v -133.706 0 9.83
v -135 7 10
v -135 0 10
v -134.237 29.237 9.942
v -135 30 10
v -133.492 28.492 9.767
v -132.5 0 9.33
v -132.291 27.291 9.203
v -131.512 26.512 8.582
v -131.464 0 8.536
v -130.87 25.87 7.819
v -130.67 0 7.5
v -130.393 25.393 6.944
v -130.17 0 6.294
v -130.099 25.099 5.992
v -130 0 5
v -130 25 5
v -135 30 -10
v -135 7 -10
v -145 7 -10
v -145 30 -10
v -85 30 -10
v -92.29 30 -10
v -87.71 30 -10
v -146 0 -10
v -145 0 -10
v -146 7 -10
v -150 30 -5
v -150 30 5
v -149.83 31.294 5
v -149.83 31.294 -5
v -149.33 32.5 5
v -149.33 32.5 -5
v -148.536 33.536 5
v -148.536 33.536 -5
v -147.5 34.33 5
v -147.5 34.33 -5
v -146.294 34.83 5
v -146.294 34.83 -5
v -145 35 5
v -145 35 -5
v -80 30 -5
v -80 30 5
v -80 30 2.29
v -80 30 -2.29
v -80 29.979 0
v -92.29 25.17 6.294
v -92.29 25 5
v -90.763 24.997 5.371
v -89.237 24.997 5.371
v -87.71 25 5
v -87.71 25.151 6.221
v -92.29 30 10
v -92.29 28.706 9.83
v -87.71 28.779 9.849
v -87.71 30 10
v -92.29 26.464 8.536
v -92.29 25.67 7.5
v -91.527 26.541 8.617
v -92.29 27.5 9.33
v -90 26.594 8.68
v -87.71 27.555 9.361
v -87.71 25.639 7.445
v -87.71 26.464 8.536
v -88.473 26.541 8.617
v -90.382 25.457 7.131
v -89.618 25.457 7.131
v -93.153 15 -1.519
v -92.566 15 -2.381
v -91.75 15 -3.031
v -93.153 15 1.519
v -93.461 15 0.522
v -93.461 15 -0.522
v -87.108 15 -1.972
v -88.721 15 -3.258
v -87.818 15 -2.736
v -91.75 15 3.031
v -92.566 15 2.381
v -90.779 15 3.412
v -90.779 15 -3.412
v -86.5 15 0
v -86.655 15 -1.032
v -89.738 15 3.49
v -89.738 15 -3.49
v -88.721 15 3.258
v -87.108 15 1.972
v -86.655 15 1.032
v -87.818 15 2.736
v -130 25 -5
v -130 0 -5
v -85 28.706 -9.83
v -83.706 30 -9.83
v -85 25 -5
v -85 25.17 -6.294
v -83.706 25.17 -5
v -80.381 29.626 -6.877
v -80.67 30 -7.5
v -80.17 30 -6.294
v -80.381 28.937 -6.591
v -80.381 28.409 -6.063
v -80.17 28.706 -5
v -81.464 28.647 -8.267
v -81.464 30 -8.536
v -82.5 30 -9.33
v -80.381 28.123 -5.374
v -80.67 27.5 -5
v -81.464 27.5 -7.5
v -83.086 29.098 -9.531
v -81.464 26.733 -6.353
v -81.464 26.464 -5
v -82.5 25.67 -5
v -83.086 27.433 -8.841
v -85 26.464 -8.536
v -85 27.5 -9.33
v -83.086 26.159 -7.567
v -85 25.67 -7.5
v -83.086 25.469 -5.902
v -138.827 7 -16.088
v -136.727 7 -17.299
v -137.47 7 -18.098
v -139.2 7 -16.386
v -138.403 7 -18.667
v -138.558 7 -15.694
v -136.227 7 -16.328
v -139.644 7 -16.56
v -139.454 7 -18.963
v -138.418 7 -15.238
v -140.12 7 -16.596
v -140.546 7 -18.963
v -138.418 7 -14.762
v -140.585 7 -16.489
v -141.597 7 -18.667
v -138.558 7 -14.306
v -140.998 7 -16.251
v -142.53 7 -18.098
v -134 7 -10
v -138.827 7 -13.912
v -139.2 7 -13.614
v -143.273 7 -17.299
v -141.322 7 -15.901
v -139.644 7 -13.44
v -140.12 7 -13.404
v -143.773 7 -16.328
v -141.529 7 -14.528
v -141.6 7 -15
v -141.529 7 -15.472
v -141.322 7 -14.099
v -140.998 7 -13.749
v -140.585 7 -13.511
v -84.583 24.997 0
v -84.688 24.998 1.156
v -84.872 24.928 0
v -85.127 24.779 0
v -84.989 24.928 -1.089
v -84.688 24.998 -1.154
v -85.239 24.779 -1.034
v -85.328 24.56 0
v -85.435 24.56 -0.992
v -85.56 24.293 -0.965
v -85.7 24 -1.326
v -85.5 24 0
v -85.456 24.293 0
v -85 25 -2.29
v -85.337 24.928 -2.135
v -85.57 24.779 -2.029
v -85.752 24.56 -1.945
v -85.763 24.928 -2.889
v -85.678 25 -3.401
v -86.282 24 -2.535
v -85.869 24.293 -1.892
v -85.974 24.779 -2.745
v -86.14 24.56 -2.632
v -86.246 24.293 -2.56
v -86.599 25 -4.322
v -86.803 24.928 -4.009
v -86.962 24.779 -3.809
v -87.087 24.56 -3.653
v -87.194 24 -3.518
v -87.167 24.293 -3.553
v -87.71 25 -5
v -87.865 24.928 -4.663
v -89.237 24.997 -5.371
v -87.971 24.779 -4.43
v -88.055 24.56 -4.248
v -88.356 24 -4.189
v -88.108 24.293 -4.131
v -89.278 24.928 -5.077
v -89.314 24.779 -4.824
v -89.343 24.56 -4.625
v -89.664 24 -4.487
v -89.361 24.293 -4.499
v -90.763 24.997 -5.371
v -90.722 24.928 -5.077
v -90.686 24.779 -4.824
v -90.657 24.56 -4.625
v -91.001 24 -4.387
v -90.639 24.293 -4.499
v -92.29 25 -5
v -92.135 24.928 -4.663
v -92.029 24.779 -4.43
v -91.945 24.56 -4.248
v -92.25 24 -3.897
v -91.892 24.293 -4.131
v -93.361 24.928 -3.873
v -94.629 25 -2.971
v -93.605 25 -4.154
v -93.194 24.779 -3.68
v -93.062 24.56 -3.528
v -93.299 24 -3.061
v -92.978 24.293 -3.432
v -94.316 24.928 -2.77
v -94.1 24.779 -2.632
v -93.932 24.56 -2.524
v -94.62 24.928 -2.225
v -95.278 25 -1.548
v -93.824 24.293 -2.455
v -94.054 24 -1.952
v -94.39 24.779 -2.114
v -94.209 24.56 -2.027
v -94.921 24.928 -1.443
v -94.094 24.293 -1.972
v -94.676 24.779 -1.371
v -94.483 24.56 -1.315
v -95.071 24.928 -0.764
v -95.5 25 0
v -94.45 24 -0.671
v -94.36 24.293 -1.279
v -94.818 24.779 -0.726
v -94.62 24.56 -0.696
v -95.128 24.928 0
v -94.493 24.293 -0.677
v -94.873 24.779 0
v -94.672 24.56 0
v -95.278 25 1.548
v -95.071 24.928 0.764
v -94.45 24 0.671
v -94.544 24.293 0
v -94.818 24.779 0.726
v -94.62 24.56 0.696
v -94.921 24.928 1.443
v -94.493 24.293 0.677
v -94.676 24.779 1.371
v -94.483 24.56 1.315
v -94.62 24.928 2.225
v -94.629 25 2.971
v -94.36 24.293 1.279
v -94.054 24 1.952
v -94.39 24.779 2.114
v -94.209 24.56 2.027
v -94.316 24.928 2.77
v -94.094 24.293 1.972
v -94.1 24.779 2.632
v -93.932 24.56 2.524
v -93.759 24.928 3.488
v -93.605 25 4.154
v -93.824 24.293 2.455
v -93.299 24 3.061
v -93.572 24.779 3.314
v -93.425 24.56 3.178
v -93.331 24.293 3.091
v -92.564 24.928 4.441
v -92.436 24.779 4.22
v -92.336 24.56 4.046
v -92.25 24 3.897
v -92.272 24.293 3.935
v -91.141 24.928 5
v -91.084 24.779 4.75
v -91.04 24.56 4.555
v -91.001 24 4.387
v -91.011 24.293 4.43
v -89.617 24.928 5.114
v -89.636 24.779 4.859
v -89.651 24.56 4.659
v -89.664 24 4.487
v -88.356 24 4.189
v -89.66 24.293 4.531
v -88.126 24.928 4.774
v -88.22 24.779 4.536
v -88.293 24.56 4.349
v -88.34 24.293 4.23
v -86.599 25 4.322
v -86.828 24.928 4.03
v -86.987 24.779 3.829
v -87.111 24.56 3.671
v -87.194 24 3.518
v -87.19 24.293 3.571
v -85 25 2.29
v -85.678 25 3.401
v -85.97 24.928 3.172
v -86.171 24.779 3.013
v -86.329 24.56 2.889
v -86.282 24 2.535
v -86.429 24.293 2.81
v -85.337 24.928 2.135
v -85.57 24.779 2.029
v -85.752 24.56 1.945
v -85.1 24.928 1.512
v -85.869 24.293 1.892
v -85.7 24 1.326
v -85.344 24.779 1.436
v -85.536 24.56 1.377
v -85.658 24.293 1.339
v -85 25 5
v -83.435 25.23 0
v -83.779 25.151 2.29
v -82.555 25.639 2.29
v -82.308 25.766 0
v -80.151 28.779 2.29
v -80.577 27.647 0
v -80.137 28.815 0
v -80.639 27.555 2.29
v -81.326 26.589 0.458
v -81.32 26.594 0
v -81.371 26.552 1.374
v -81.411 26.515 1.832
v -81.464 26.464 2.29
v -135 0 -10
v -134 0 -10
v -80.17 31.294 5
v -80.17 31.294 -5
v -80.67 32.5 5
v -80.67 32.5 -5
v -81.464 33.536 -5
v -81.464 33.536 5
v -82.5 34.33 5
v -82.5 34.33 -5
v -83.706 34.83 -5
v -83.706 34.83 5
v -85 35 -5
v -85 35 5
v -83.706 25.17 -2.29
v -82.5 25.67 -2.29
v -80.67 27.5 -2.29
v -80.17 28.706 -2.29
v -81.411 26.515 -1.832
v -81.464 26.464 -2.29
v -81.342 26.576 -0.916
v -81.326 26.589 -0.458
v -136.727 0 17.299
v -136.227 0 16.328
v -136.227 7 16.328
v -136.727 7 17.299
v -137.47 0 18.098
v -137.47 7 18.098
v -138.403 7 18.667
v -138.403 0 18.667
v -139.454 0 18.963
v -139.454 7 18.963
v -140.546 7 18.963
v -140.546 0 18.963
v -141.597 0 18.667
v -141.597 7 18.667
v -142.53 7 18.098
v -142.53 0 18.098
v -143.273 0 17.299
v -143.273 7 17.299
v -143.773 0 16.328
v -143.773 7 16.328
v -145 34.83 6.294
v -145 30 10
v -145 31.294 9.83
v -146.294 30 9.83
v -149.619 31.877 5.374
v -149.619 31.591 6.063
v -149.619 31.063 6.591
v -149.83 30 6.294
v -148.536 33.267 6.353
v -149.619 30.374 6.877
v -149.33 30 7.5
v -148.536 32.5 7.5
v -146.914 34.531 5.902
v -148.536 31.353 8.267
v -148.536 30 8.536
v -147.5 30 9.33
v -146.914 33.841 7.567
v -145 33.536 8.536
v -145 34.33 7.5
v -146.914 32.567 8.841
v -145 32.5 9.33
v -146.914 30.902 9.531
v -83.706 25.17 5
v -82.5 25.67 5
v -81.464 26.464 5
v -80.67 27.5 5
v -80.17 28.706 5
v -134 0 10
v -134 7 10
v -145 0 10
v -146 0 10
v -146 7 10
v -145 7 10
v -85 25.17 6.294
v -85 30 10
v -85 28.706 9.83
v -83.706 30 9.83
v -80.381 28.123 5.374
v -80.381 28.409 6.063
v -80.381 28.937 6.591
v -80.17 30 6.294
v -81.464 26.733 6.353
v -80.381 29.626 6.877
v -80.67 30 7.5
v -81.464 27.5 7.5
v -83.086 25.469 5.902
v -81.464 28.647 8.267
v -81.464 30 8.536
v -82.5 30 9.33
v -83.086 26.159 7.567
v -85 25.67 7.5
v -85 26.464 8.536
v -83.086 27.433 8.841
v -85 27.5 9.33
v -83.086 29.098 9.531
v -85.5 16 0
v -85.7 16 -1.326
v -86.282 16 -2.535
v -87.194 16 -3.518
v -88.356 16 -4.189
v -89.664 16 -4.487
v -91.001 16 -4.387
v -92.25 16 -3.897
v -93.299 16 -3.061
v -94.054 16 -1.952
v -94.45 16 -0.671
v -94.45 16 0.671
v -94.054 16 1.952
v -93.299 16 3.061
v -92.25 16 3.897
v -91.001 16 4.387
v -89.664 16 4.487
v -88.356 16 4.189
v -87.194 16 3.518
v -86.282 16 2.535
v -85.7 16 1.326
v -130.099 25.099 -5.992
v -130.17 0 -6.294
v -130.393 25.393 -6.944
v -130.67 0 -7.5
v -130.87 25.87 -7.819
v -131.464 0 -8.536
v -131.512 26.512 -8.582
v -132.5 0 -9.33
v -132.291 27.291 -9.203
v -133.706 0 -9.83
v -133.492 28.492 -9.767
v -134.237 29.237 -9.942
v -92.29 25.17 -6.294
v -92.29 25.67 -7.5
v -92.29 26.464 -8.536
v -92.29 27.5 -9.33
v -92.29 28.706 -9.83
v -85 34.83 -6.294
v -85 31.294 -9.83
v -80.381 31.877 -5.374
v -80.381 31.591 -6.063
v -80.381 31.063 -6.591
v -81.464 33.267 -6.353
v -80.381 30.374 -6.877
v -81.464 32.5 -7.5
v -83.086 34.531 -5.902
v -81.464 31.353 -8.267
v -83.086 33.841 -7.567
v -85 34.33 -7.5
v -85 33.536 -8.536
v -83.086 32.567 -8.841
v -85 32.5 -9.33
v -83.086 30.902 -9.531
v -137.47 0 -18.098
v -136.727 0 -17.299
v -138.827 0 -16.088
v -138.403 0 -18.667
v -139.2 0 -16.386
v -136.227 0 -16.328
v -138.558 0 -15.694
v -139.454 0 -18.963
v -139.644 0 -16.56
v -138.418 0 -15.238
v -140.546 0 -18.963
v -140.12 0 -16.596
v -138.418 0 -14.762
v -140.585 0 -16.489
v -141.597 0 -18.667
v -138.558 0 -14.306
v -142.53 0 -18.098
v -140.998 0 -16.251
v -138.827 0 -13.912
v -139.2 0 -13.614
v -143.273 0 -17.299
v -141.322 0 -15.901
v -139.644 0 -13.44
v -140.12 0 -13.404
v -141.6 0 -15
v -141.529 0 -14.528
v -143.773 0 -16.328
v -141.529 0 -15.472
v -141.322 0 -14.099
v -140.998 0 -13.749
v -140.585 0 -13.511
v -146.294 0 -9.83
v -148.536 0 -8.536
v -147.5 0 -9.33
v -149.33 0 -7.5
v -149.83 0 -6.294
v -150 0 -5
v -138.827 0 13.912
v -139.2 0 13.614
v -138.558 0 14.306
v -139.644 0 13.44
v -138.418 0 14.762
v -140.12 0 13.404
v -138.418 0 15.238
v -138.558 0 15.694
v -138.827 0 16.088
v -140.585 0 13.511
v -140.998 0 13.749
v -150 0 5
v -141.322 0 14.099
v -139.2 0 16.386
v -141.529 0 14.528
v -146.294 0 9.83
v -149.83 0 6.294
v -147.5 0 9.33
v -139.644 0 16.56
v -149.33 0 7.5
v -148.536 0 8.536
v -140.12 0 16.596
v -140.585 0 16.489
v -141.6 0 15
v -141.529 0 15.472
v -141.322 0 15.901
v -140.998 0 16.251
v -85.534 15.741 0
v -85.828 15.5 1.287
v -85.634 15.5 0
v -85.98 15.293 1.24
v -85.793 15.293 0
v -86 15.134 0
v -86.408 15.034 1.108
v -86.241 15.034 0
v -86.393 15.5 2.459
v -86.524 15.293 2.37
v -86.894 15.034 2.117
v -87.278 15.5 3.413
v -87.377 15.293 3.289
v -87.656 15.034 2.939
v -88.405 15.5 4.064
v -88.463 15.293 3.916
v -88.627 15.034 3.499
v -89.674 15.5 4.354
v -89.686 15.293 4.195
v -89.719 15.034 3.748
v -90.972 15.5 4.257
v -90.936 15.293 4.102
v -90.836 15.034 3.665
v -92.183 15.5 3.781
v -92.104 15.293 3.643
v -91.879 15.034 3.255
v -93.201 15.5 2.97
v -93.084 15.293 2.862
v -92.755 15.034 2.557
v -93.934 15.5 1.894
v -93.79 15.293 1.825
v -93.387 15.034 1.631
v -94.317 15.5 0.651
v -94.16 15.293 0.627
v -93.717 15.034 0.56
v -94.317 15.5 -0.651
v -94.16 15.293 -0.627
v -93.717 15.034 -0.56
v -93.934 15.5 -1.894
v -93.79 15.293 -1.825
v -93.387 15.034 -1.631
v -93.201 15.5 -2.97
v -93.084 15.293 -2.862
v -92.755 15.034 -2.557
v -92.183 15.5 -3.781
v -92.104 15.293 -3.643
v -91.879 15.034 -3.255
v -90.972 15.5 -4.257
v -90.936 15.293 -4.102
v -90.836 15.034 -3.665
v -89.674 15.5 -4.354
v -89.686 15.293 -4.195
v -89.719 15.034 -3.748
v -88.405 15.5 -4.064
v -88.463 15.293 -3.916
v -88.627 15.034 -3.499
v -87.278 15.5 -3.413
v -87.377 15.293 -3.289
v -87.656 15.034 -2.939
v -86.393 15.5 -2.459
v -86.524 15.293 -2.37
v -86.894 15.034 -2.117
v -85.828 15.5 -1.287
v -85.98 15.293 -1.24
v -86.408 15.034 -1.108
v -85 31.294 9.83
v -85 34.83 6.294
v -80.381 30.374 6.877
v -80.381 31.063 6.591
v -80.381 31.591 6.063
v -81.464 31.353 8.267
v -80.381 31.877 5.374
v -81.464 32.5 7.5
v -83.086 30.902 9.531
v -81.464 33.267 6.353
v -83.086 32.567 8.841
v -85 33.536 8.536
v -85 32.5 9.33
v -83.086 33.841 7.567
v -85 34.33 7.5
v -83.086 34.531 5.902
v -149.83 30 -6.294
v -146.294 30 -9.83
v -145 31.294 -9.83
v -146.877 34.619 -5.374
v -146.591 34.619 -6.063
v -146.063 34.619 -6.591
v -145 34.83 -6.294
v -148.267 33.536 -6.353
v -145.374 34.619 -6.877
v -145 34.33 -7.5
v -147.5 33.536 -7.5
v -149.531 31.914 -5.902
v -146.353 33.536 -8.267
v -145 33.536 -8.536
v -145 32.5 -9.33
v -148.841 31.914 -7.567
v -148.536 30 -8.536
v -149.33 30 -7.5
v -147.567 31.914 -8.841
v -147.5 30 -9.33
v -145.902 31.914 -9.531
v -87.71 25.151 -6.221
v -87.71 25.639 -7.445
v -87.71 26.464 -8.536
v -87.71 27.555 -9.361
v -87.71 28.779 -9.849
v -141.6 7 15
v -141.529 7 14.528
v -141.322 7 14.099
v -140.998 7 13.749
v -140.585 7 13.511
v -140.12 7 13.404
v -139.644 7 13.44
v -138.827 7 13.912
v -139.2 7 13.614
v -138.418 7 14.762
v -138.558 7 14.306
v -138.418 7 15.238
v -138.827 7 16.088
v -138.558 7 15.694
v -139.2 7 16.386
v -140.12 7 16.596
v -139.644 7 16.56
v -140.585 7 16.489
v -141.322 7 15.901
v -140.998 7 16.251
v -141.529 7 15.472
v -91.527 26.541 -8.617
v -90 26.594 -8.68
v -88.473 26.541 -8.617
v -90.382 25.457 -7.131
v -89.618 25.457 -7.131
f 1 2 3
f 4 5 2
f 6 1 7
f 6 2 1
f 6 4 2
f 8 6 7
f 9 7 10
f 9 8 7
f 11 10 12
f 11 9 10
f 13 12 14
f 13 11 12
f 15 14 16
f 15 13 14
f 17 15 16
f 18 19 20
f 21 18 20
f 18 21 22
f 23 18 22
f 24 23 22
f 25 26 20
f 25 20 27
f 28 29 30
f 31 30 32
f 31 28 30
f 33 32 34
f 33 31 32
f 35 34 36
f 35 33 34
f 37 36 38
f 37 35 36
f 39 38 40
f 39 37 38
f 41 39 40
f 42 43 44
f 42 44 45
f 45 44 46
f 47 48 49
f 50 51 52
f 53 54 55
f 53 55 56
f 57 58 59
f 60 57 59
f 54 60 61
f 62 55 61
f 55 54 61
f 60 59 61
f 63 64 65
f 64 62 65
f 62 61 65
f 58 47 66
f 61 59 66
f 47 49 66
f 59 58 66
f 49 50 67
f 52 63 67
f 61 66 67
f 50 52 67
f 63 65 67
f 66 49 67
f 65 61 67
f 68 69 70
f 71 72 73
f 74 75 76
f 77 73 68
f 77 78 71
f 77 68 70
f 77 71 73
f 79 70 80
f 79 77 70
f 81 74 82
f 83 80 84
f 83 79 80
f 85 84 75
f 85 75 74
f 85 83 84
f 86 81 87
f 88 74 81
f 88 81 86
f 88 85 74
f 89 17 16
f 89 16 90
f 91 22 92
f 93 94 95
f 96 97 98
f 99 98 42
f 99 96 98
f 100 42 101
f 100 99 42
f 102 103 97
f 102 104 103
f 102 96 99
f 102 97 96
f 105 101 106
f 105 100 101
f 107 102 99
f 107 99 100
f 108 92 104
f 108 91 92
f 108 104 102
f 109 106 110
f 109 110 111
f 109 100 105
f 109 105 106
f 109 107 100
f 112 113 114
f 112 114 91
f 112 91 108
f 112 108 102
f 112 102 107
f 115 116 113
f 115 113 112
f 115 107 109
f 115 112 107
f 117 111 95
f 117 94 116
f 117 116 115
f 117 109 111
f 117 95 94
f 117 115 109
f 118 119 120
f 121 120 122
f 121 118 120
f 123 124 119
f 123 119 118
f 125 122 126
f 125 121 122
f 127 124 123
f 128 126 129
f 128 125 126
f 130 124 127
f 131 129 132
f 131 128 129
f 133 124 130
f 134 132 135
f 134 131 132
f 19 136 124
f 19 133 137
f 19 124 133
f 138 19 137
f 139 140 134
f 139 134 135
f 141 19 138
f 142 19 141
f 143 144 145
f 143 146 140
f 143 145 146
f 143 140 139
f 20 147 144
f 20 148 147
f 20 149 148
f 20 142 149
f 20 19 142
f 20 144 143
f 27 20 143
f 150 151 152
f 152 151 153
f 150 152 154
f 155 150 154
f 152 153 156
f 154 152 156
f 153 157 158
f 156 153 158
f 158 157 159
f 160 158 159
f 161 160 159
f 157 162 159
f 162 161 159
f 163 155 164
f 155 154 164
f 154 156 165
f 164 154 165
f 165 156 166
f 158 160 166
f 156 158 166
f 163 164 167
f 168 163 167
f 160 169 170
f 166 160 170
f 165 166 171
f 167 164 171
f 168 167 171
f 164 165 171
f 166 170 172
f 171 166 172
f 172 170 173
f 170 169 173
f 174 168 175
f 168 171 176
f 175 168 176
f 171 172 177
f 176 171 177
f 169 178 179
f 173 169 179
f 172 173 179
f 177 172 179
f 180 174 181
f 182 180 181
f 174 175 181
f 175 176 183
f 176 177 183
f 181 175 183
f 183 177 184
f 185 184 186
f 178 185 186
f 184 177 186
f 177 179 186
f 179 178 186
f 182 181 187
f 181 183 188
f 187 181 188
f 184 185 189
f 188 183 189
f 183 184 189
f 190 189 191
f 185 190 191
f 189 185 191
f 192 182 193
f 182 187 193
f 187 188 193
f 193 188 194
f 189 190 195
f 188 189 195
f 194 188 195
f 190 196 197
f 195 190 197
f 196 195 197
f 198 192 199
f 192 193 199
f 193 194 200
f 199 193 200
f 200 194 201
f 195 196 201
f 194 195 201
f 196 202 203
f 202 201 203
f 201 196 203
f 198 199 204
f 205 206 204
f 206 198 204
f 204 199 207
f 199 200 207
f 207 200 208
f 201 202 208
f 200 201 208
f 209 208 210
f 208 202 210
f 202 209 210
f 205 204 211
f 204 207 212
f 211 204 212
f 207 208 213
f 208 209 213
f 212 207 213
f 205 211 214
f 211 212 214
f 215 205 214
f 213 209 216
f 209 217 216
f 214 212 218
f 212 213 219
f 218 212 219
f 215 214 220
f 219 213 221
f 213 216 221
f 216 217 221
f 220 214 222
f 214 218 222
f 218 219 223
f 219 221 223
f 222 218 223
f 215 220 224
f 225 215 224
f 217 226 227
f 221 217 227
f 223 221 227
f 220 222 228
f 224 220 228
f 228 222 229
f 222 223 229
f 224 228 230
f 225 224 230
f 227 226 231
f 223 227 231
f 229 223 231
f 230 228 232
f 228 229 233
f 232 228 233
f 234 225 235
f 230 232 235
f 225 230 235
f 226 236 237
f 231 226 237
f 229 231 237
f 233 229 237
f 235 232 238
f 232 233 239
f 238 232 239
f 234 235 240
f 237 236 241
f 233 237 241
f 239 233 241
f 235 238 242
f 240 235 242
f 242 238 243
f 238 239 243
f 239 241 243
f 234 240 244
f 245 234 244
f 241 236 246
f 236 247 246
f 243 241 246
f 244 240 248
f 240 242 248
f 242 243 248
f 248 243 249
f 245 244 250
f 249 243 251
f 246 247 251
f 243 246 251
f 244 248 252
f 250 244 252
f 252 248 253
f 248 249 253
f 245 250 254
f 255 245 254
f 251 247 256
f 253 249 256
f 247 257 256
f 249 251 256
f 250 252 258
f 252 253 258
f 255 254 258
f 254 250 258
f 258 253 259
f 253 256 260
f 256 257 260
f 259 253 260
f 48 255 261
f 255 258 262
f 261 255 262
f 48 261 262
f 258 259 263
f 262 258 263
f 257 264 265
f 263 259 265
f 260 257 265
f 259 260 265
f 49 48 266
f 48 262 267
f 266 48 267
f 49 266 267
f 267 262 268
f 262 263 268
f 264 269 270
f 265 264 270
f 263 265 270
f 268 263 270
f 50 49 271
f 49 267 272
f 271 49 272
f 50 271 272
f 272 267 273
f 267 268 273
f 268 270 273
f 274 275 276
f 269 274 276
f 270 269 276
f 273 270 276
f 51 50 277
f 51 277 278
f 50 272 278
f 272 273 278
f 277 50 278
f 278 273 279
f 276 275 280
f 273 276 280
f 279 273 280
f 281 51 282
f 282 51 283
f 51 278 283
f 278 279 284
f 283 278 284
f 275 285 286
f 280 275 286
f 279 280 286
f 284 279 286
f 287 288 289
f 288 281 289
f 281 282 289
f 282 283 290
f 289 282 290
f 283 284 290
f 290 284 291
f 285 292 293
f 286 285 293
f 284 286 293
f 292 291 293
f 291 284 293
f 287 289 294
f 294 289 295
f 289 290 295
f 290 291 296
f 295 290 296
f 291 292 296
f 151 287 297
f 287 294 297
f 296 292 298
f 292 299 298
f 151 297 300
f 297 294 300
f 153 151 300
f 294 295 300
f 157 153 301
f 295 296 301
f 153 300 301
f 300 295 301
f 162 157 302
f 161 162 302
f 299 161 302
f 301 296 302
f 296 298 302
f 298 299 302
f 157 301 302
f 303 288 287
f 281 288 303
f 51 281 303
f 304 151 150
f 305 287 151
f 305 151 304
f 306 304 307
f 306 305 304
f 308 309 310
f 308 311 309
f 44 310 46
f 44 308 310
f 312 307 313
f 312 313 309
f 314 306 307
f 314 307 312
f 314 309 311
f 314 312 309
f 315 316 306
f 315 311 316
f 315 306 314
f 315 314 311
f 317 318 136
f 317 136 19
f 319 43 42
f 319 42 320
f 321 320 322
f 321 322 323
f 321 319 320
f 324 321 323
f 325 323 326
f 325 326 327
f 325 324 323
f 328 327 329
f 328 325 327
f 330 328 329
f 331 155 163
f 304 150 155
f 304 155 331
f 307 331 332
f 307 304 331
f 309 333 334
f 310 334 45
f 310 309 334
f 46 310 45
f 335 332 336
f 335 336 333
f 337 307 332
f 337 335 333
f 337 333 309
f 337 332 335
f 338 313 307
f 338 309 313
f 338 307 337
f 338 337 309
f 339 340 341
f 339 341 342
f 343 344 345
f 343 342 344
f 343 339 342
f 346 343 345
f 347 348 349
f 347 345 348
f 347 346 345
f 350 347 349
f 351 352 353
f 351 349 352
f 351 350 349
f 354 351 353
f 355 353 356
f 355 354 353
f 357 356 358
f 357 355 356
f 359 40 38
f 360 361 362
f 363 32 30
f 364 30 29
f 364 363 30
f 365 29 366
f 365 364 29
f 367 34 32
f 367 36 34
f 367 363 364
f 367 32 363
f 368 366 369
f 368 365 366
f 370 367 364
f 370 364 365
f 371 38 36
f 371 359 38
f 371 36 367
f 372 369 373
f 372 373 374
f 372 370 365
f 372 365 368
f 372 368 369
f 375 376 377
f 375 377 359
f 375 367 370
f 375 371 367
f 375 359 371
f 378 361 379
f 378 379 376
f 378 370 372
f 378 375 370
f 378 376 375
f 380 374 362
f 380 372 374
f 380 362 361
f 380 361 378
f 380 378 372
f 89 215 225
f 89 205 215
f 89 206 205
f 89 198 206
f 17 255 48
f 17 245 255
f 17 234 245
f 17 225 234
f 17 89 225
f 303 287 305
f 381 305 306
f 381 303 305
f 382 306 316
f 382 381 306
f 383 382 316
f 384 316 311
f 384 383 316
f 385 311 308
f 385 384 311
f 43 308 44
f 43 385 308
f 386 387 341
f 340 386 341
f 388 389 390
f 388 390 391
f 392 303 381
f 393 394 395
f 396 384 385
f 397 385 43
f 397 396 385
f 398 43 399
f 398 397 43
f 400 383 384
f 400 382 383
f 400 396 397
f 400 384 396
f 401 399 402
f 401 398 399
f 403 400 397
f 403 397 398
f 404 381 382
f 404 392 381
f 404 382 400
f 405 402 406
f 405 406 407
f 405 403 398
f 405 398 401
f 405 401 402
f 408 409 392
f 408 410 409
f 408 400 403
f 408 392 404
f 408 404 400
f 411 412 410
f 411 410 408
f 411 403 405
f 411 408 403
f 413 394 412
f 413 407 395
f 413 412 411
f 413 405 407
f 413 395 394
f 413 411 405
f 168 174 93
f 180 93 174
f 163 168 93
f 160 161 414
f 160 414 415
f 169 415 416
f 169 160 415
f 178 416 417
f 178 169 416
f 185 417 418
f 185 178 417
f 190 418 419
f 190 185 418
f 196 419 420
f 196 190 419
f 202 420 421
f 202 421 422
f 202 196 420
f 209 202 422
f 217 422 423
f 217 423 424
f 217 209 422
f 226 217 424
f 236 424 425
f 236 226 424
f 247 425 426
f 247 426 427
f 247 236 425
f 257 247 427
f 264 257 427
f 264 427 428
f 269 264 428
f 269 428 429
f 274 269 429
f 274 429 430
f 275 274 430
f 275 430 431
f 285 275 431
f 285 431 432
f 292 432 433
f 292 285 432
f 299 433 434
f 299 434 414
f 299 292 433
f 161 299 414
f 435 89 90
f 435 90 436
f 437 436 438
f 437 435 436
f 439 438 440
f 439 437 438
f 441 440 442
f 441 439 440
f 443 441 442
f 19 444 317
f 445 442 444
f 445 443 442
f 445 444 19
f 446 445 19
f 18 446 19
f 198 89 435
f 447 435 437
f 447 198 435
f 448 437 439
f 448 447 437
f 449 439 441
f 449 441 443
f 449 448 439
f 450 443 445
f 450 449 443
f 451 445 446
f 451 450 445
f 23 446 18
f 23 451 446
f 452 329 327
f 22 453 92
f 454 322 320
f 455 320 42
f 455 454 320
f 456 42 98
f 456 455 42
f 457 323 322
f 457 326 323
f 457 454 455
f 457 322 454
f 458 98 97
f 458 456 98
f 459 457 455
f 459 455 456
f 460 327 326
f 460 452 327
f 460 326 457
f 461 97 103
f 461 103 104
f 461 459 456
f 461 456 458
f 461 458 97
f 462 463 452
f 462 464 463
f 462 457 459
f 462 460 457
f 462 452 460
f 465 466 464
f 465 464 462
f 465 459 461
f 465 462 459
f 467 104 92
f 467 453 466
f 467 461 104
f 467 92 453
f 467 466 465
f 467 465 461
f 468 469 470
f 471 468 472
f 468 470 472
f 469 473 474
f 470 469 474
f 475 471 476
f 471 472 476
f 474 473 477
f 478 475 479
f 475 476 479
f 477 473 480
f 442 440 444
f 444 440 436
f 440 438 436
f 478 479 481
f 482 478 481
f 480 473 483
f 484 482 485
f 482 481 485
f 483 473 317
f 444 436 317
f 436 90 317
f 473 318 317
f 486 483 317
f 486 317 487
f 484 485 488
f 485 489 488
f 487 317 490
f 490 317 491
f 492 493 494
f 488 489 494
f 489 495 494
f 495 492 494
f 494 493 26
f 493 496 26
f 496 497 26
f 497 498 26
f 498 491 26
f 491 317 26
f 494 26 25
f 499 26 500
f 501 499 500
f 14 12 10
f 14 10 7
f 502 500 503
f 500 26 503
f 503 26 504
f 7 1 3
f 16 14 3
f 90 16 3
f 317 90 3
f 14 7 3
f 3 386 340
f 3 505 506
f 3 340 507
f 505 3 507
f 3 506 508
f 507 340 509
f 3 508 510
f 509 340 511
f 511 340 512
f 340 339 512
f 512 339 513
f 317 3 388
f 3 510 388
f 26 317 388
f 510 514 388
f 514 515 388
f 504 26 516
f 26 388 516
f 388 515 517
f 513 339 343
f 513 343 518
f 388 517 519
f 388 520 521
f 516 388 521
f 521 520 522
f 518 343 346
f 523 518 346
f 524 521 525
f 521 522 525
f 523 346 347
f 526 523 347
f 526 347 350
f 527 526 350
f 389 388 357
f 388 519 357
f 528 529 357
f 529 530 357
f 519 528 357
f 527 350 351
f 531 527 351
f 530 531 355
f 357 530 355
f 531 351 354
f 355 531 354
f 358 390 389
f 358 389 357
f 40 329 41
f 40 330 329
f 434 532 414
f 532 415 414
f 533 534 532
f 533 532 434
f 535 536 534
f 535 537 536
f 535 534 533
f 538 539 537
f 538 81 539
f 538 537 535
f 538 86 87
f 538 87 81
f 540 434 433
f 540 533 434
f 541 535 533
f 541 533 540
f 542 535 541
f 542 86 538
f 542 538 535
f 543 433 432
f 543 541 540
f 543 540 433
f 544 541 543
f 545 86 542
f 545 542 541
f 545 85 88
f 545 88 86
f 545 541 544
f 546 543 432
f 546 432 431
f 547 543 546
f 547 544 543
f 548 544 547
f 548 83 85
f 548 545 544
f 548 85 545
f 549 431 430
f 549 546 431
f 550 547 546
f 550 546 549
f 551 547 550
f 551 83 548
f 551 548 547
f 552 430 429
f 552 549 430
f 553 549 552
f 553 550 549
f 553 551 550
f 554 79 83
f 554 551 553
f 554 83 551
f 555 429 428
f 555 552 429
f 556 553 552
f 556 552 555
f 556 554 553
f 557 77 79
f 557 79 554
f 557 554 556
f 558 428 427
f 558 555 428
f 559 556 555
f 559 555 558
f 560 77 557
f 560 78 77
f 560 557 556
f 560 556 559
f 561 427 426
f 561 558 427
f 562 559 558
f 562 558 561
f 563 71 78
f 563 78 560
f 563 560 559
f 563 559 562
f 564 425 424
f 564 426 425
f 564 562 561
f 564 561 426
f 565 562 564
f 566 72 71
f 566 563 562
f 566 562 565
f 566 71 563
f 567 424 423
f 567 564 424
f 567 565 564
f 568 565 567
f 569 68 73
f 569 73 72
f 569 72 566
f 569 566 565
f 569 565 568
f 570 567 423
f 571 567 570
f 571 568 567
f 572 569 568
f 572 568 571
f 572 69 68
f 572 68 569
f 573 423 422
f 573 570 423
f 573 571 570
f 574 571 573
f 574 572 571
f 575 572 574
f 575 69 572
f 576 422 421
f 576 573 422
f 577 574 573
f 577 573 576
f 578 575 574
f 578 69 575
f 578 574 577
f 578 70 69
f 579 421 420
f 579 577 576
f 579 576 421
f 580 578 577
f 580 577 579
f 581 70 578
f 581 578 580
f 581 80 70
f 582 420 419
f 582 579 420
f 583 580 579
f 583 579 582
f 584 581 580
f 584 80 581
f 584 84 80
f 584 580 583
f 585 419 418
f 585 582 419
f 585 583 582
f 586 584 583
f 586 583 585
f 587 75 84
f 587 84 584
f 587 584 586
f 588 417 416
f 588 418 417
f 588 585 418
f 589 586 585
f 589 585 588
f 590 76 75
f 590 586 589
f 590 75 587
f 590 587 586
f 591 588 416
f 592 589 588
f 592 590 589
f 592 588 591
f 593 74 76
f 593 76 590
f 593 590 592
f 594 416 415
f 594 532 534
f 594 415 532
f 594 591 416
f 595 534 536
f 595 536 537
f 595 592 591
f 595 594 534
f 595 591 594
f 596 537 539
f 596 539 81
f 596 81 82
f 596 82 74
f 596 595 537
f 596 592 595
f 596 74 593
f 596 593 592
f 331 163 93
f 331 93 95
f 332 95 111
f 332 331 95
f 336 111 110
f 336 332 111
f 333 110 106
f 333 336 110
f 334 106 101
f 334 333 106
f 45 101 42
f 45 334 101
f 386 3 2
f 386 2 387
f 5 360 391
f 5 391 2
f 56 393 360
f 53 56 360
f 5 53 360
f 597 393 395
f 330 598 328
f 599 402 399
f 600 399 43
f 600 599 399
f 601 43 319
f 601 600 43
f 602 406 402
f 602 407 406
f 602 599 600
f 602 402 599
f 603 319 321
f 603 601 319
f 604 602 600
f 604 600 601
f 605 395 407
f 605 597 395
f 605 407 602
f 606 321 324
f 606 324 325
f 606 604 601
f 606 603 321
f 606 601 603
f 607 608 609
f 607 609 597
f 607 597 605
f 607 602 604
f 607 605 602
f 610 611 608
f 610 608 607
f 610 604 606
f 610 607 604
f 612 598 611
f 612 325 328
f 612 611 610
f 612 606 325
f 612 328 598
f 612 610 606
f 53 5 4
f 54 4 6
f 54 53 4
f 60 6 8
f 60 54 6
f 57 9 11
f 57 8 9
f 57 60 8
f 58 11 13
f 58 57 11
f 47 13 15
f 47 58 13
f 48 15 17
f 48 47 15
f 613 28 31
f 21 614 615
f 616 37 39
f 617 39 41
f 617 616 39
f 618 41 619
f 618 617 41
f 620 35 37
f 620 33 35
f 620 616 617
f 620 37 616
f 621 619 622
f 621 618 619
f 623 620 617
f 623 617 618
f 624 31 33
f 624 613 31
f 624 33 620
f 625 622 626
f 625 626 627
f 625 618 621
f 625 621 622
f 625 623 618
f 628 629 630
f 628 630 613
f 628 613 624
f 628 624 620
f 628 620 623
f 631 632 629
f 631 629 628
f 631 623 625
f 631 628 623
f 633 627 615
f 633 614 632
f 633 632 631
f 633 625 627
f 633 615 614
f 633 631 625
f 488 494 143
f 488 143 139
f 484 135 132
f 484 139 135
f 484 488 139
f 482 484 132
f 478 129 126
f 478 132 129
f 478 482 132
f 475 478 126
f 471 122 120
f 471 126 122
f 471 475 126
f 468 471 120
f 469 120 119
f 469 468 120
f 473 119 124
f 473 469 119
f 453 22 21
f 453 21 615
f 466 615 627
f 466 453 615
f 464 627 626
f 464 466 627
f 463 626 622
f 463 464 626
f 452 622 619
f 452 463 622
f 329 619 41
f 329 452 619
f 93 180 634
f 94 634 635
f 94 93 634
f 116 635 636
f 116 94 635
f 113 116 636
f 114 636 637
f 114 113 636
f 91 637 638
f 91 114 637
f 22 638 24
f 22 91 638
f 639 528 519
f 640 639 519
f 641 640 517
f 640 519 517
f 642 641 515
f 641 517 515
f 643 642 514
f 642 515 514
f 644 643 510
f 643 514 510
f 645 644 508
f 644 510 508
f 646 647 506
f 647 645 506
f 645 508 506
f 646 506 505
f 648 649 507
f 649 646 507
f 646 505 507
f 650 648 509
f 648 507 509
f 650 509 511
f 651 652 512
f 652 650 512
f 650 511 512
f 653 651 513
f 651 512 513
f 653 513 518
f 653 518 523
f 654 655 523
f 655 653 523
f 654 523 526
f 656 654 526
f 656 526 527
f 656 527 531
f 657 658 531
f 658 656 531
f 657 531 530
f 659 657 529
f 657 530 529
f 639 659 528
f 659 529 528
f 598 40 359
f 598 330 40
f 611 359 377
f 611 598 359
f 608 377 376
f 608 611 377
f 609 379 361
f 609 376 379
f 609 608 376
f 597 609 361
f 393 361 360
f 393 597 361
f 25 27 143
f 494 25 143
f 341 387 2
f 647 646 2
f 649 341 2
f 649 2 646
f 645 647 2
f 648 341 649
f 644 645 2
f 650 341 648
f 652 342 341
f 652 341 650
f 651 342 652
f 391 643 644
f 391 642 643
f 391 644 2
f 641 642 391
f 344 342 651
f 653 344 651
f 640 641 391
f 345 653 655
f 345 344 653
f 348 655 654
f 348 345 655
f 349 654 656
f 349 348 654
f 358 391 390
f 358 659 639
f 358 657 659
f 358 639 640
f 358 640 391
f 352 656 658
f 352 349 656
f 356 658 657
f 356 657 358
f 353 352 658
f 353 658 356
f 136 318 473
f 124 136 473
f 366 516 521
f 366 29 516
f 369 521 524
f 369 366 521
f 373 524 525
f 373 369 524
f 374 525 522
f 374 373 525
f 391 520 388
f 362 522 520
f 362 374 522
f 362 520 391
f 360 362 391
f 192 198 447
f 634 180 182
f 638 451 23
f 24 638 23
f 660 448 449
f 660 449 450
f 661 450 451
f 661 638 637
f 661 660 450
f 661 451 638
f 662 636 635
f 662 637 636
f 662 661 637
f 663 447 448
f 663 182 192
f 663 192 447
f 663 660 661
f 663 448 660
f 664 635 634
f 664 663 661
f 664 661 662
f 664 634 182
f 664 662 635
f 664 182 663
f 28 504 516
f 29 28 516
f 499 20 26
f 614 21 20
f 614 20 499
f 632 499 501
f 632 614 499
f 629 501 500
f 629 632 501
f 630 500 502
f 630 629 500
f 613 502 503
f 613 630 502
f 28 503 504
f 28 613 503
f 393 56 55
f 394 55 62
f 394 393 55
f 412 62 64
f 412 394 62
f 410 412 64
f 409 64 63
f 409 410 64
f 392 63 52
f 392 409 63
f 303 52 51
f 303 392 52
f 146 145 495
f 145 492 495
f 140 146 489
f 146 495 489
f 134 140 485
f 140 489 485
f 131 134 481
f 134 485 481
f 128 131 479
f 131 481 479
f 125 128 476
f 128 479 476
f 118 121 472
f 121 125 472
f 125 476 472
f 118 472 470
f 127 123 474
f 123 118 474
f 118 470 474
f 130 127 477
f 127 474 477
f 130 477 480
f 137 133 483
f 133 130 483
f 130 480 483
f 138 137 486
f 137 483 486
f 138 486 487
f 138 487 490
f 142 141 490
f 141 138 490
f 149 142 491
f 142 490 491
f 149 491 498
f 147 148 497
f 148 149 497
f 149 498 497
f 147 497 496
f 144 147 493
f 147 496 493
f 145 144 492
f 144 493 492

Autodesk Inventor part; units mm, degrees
ref_plane "YZ Plane" through (0, 0, 0) normal (1, 0, 0) x (0, 1, 0)
ref_plane "XZ Plane" through (0, 0, 0) normal (0, 1, 0) x (-1, 0, 0)
ref_plane "XY Plane" through (0, 0, 0) normal (0, 0, 1) x (1, 0, 0)
sketch "Szkic1" plane through (0, 0, 0) normal (0, 1, 0) x (-1, 0, 0)
  line L0 (180, 0) -> (-30, 0) projected
  line L1 (0, -42.9384) -> (0, 29.3231) projected
  line L2 (150, 10) -> (130, 10)
  line L3 (130, 10) -> (130, -10)
  line L4 (130, -10) -> (150, -10)
  line L5 (150, -10) -> (150, 10)
  line L6 (150, 10) -> (130, -10) construction
  line L7 (130, 10) -> (150, -10) construction
  circle A0 centre (140, -15) radius 1.6
  circle A1 centre (140, -15) radius 4
  line L8 (146, -10) -> (143.7732, -16.3278)
  line L9 (140, 0) -> (140, -32.6153) construction
  line L10 (134, -10) -> (136.2268, -16.3278)
  circle A2 centre (140, 15) radius 1.6
  circle A3 centre (140, 15) radius 4
  line L11 (146, 10) -> (143.7732, 16.3278)
  line L12 (134, 10) -> (136.2268, 16.3278)
  point P0 (0, 0)
  dimension "d21" = 8
  dimension "d3" = 20
  dimension "d4" = 20
  dimension "d5" = 140
  dimension "d19" = 3.2
  dimension "d20" = 15
  dimension "d22" = 12
extrude "Wyciągnięcie proste1" add sketch "Szkic1" along normal blind 35 contours L5 L4 L3 L0 | L0 L3 L2 L5
sketch "Szkic2" plane through (-130, 0, 10) normal (1, 0, 0) x (0, 0, -1)
  line L0 (10, -7) -> (10, 42) projected
  line L1 (24, 0) -> (-4, 0) projected
  line L2 (0, 35) -> (20, 35)
  line L3 (20, 35) -> (20, 25)
  line L4 (20, 25) -> (0, 25)
  line L5 (0, 25) -> (0, 35)
  line L6 (0, 35) -> (20, 25) construction
  line L7 (20, 35) -> (0, 25) construction
  line L8 (0, 0) -> (20, 0) projected
  point P0 (10, 0)
  point P1 (10, 30)
  point P2 (10, 0)
  dimension "d8" = 20
  dimension "d9" = 10
  dimension "d10" = 30
extrude "Wyciągnięcie proste2" add sketch "Szkic2" along normal blind 50
sketch "Szkic3" plane through (-130, 25, -10) normal (0, -1, 0) x (1, 0, 0)
  circle A0 centre (40, 10) radius 4.5
  line L0 (130, -4) -> (130, 24) projected
  line L1 (-50, 10) -> (160, 10) projected
  point P0 (130, 10)
  dimension "d13" = 9
  dimension "d14" = 90
extrude "Wyciągnięcie proste3" add sketch "Szkic3" along normal blind 10
fillet "Zaokrąglenie1" radius 1 2 edges at (-94.5, 15, 0) (-94.5, 25, 0)
fillet "Zaokrąglenie2" radius 5 13 edges at (-105, 25, 10) (-130, 12.5, 10) (-130, 12.5, -10) (-105, 25, -10) (-115, 35, 10) (-150, 17.5, -10) (-150, 17.5, 10) (-115, 35, -10) (-80, 25, 0) (-80, 35, 0) (-80, 30, -10) (-80, 30, 10) (-150, 35, 0)
extrude "Wyciągnięcie proste4" add sketch "Szkic1" along normal blind 7 contours L8 A1 L10 L4 | L2 L12 A3 L11 | A1 | A3
properties part number "uMule-uchwyt_servo"
